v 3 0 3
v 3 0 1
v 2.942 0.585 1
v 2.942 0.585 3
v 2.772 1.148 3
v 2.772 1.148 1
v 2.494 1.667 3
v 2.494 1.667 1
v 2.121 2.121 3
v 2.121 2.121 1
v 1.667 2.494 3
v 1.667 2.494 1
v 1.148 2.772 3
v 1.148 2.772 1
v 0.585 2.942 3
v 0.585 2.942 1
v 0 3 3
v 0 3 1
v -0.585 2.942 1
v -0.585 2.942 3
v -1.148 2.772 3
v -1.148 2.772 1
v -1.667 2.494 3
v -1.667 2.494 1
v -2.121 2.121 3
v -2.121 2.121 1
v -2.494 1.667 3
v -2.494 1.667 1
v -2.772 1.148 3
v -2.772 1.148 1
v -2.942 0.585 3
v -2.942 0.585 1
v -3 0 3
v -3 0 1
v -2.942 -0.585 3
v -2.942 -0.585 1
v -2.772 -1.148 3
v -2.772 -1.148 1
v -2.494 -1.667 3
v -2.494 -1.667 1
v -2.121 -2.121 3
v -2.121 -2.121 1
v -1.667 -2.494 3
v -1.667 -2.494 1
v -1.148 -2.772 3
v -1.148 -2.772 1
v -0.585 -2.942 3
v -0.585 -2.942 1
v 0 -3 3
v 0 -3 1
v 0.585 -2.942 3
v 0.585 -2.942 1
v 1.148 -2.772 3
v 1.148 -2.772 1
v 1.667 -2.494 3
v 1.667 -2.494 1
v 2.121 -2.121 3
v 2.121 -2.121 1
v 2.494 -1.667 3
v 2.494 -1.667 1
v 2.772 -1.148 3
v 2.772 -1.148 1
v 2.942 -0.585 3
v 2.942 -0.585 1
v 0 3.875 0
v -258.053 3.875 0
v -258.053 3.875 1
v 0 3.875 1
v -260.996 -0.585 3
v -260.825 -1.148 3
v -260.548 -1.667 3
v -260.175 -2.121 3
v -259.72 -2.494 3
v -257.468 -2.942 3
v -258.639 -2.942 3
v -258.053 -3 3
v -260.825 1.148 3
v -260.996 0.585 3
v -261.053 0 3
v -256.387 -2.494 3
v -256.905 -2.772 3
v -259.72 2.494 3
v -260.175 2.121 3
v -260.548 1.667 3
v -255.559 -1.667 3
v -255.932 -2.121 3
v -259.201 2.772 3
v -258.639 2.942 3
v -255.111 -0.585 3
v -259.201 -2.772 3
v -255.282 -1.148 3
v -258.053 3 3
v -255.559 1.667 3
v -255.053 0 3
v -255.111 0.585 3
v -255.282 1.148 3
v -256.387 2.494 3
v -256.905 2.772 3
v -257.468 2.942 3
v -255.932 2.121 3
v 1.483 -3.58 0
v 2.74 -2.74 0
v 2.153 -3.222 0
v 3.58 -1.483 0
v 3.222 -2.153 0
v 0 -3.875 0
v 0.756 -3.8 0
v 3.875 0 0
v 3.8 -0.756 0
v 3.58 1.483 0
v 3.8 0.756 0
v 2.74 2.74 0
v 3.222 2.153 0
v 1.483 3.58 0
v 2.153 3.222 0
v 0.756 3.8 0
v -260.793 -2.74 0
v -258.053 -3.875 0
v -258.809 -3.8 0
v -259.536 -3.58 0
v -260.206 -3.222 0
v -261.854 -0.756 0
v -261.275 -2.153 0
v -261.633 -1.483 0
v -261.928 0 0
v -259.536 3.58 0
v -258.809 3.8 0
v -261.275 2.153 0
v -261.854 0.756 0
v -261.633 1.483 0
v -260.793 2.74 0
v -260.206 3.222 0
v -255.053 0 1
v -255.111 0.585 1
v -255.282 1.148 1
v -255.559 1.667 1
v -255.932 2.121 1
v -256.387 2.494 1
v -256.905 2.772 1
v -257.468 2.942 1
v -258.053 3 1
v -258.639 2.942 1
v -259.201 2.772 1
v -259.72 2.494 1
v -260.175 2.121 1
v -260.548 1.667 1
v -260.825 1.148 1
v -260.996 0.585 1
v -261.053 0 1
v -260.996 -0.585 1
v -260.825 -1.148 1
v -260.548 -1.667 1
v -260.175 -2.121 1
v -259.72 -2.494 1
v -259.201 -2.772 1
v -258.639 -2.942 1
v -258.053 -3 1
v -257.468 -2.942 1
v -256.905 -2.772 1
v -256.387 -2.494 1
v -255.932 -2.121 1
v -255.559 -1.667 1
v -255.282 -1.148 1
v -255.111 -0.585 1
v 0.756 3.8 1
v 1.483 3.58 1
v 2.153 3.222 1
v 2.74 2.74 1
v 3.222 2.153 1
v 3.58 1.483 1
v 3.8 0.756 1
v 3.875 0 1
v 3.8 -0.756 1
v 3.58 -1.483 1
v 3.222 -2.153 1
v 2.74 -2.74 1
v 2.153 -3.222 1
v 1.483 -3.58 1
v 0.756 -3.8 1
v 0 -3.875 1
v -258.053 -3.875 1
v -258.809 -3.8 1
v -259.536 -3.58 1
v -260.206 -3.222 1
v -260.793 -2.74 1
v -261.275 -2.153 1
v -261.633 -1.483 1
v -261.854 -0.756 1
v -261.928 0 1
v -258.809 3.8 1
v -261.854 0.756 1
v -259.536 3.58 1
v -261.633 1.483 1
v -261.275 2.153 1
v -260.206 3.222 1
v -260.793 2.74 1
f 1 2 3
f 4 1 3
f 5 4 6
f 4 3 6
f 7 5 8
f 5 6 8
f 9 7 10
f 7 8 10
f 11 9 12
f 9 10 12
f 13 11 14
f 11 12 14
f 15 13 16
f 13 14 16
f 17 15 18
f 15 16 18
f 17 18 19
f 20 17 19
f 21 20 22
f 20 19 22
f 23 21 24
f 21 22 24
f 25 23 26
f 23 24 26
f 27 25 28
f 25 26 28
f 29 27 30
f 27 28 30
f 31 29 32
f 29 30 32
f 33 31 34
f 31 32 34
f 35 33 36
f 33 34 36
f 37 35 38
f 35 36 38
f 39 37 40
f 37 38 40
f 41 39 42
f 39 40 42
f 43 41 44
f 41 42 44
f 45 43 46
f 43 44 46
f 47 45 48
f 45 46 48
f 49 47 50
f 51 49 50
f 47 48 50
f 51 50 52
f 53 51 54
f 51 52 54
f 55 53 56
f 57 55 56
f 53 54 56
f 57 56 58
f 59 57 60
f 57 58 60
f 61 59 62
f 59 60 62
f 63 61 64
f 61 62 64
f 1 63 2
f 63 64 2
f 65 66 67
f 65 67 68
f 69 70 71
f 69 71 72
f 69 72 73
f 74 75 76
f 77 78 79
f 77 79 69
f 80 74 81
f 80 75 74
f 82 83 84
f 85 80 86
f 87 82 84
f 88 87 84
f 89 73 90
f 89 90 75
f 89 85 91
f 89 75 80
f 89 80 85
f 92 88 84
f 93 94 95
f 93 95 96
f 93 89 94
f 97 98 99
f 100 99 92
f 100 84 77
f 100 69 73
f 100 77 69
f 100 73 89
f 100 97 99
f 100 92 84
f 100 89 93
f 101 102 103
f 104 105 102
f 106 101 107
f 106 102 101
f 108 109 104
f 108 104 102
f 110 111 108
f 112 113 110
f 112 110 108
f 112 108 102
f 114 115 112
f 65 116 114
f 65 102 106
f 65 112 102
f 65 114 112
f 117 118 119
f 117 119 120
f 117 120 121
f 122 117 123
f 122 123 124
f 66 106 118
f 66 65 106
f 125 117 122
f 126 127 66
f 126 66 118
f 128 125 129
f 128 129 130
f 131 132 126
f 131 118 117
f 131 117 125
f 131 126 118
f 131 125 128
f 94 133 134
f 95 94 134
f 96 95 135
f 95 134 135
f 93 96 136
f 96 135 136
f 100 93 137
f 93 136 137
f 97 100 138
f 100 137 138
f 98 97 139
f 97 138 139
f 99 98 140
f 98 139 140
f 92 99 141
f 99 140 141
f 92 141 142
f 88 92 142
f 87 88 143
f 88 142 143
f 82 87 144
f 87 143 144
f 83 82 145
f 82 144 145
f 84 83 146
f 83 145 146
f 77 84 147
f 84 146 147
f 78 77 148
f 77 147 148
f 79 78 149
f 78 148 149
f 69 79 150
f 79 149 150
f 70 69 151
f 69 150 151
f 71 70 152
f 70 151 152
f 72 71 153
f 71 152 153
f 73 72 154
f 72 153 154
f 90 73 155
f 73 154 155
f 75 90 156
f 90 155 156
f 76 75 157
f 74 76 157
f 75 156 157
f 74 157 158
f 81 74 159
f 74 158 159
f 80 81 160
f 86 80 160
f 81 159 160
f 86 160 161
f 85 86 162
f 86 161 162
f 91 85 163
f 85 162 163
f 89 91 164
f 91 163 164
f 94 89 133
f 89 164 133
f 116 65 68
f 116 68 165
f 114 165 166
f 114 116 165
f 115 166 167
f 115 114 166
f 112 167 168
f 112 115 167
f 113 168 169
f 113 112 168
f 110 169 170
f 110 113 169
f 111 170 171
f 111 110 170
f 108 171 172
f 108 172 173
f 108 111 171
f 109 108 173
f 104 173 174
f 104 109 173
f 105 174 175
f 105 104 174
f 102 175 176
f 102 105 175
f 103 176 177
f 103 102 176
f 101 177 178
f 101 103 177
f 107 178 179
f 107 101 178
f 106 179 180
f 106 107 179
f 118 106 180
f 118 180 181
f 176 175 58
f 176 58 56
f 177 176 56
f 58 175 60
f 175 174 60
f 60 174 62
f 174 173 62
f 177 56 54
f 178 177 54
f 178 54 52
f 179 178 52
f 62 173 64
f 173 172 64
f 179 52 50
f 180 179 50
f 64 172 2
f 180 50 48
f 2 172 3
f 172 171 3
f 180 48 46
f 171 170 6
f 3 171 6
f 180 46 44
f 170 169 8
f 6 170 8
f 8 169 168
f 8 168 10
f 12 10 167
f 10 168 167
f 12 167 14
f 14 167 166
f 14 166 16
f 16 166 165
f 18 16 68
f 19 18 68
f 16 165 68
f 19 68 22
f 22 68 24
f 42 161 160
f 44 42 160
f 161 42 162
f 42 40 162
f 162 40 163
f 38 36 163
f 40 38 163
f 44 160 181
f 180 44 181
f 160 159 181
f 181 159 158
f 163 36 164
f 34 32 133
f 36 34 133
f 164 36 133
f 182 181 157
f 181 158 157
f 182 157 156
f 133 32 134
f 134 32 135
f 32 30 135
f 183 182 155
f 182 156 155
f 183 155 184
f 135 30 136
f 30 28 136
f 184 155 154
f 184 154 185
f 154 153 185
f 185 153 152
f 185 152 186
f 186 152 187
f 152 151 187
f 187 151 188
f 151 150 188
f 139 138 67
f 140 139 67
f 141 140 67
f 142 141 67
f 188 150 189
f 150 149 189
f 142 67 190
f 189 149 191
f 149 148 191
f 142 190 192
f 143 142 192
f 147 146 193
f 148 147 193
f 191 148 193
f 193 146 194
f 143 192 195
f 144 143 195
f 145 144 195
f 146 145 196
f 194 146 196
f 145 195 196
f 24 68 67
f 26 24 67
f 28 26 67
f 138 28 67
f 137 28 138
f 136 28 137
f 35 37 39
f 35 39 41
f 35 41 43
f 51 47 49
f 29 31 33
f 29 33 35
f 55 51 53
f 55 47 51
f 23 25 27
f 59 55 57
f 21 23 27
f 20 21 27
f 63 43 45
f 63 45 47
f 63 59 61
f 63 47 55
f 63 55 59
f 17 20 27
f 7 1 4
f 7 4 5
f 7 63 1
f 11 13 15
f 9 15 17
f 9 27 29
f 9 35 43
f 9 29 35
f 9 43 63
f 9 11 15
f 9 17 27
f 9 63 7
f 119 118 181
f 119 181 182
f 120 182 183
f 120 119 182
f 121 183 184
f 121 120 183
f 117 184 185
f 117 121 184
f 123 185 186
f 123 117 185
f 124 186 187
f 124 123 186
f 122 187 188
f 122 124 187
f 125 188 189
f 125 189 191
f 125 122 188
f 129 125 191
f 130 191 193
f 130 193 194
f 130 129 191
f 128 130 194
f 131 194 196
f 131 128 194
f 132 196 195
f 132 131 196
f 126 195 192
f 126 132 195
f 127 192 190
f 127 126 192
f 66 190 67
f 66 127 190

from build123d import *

# Parameters (mm, degrees)
EXTRUDE_1_DEPTH = 1
SKETCH_2_R      = 3
EXTRUDE_2_DEPTH = 2
SKETCH_3_R      = 3
EXTRUDE_3_DEPTH = 2


with BuildPart() as part:
    # 草图1 → 凸台-拉伸1 (new body)
    with BuildSketch(Plane.XY):
        with BuildLine():
            Line((0, -3.874788925), (-258.053276248, -3.874788925))
            ThreePointArc((-258.053276248, -3.874788925), (-261.928065173, 0), (-258.053276248, 3.874788925))
            Line((-258.053276248, 3.874788925), (0, 3.874788925))
            ThreePointArc((0, 3.874788925), (3.874788925, 0), (0, -3.874788925))
        make_face()
    extrude(amount=EXTRUDE_1_DEPTH)

    # 草图2 → 凸台-拉伸2 (add)
    with BuildSketch(Plane.XY.offset(1)):
        Circle(SKETCH_2_R)
    extrude(amount=EXTRUDE_2_DEPTH)

    # 草图3 → 凸台-拉伸3 (add)
    with BuildSketch(Plane.XY.offset(1)):
        with Locations((-258.053276248, 0)):
            Circle(SKETCH_3_R)
    extrude(amount=EXTRUDE_3_DEPTH)


solid = part.part
